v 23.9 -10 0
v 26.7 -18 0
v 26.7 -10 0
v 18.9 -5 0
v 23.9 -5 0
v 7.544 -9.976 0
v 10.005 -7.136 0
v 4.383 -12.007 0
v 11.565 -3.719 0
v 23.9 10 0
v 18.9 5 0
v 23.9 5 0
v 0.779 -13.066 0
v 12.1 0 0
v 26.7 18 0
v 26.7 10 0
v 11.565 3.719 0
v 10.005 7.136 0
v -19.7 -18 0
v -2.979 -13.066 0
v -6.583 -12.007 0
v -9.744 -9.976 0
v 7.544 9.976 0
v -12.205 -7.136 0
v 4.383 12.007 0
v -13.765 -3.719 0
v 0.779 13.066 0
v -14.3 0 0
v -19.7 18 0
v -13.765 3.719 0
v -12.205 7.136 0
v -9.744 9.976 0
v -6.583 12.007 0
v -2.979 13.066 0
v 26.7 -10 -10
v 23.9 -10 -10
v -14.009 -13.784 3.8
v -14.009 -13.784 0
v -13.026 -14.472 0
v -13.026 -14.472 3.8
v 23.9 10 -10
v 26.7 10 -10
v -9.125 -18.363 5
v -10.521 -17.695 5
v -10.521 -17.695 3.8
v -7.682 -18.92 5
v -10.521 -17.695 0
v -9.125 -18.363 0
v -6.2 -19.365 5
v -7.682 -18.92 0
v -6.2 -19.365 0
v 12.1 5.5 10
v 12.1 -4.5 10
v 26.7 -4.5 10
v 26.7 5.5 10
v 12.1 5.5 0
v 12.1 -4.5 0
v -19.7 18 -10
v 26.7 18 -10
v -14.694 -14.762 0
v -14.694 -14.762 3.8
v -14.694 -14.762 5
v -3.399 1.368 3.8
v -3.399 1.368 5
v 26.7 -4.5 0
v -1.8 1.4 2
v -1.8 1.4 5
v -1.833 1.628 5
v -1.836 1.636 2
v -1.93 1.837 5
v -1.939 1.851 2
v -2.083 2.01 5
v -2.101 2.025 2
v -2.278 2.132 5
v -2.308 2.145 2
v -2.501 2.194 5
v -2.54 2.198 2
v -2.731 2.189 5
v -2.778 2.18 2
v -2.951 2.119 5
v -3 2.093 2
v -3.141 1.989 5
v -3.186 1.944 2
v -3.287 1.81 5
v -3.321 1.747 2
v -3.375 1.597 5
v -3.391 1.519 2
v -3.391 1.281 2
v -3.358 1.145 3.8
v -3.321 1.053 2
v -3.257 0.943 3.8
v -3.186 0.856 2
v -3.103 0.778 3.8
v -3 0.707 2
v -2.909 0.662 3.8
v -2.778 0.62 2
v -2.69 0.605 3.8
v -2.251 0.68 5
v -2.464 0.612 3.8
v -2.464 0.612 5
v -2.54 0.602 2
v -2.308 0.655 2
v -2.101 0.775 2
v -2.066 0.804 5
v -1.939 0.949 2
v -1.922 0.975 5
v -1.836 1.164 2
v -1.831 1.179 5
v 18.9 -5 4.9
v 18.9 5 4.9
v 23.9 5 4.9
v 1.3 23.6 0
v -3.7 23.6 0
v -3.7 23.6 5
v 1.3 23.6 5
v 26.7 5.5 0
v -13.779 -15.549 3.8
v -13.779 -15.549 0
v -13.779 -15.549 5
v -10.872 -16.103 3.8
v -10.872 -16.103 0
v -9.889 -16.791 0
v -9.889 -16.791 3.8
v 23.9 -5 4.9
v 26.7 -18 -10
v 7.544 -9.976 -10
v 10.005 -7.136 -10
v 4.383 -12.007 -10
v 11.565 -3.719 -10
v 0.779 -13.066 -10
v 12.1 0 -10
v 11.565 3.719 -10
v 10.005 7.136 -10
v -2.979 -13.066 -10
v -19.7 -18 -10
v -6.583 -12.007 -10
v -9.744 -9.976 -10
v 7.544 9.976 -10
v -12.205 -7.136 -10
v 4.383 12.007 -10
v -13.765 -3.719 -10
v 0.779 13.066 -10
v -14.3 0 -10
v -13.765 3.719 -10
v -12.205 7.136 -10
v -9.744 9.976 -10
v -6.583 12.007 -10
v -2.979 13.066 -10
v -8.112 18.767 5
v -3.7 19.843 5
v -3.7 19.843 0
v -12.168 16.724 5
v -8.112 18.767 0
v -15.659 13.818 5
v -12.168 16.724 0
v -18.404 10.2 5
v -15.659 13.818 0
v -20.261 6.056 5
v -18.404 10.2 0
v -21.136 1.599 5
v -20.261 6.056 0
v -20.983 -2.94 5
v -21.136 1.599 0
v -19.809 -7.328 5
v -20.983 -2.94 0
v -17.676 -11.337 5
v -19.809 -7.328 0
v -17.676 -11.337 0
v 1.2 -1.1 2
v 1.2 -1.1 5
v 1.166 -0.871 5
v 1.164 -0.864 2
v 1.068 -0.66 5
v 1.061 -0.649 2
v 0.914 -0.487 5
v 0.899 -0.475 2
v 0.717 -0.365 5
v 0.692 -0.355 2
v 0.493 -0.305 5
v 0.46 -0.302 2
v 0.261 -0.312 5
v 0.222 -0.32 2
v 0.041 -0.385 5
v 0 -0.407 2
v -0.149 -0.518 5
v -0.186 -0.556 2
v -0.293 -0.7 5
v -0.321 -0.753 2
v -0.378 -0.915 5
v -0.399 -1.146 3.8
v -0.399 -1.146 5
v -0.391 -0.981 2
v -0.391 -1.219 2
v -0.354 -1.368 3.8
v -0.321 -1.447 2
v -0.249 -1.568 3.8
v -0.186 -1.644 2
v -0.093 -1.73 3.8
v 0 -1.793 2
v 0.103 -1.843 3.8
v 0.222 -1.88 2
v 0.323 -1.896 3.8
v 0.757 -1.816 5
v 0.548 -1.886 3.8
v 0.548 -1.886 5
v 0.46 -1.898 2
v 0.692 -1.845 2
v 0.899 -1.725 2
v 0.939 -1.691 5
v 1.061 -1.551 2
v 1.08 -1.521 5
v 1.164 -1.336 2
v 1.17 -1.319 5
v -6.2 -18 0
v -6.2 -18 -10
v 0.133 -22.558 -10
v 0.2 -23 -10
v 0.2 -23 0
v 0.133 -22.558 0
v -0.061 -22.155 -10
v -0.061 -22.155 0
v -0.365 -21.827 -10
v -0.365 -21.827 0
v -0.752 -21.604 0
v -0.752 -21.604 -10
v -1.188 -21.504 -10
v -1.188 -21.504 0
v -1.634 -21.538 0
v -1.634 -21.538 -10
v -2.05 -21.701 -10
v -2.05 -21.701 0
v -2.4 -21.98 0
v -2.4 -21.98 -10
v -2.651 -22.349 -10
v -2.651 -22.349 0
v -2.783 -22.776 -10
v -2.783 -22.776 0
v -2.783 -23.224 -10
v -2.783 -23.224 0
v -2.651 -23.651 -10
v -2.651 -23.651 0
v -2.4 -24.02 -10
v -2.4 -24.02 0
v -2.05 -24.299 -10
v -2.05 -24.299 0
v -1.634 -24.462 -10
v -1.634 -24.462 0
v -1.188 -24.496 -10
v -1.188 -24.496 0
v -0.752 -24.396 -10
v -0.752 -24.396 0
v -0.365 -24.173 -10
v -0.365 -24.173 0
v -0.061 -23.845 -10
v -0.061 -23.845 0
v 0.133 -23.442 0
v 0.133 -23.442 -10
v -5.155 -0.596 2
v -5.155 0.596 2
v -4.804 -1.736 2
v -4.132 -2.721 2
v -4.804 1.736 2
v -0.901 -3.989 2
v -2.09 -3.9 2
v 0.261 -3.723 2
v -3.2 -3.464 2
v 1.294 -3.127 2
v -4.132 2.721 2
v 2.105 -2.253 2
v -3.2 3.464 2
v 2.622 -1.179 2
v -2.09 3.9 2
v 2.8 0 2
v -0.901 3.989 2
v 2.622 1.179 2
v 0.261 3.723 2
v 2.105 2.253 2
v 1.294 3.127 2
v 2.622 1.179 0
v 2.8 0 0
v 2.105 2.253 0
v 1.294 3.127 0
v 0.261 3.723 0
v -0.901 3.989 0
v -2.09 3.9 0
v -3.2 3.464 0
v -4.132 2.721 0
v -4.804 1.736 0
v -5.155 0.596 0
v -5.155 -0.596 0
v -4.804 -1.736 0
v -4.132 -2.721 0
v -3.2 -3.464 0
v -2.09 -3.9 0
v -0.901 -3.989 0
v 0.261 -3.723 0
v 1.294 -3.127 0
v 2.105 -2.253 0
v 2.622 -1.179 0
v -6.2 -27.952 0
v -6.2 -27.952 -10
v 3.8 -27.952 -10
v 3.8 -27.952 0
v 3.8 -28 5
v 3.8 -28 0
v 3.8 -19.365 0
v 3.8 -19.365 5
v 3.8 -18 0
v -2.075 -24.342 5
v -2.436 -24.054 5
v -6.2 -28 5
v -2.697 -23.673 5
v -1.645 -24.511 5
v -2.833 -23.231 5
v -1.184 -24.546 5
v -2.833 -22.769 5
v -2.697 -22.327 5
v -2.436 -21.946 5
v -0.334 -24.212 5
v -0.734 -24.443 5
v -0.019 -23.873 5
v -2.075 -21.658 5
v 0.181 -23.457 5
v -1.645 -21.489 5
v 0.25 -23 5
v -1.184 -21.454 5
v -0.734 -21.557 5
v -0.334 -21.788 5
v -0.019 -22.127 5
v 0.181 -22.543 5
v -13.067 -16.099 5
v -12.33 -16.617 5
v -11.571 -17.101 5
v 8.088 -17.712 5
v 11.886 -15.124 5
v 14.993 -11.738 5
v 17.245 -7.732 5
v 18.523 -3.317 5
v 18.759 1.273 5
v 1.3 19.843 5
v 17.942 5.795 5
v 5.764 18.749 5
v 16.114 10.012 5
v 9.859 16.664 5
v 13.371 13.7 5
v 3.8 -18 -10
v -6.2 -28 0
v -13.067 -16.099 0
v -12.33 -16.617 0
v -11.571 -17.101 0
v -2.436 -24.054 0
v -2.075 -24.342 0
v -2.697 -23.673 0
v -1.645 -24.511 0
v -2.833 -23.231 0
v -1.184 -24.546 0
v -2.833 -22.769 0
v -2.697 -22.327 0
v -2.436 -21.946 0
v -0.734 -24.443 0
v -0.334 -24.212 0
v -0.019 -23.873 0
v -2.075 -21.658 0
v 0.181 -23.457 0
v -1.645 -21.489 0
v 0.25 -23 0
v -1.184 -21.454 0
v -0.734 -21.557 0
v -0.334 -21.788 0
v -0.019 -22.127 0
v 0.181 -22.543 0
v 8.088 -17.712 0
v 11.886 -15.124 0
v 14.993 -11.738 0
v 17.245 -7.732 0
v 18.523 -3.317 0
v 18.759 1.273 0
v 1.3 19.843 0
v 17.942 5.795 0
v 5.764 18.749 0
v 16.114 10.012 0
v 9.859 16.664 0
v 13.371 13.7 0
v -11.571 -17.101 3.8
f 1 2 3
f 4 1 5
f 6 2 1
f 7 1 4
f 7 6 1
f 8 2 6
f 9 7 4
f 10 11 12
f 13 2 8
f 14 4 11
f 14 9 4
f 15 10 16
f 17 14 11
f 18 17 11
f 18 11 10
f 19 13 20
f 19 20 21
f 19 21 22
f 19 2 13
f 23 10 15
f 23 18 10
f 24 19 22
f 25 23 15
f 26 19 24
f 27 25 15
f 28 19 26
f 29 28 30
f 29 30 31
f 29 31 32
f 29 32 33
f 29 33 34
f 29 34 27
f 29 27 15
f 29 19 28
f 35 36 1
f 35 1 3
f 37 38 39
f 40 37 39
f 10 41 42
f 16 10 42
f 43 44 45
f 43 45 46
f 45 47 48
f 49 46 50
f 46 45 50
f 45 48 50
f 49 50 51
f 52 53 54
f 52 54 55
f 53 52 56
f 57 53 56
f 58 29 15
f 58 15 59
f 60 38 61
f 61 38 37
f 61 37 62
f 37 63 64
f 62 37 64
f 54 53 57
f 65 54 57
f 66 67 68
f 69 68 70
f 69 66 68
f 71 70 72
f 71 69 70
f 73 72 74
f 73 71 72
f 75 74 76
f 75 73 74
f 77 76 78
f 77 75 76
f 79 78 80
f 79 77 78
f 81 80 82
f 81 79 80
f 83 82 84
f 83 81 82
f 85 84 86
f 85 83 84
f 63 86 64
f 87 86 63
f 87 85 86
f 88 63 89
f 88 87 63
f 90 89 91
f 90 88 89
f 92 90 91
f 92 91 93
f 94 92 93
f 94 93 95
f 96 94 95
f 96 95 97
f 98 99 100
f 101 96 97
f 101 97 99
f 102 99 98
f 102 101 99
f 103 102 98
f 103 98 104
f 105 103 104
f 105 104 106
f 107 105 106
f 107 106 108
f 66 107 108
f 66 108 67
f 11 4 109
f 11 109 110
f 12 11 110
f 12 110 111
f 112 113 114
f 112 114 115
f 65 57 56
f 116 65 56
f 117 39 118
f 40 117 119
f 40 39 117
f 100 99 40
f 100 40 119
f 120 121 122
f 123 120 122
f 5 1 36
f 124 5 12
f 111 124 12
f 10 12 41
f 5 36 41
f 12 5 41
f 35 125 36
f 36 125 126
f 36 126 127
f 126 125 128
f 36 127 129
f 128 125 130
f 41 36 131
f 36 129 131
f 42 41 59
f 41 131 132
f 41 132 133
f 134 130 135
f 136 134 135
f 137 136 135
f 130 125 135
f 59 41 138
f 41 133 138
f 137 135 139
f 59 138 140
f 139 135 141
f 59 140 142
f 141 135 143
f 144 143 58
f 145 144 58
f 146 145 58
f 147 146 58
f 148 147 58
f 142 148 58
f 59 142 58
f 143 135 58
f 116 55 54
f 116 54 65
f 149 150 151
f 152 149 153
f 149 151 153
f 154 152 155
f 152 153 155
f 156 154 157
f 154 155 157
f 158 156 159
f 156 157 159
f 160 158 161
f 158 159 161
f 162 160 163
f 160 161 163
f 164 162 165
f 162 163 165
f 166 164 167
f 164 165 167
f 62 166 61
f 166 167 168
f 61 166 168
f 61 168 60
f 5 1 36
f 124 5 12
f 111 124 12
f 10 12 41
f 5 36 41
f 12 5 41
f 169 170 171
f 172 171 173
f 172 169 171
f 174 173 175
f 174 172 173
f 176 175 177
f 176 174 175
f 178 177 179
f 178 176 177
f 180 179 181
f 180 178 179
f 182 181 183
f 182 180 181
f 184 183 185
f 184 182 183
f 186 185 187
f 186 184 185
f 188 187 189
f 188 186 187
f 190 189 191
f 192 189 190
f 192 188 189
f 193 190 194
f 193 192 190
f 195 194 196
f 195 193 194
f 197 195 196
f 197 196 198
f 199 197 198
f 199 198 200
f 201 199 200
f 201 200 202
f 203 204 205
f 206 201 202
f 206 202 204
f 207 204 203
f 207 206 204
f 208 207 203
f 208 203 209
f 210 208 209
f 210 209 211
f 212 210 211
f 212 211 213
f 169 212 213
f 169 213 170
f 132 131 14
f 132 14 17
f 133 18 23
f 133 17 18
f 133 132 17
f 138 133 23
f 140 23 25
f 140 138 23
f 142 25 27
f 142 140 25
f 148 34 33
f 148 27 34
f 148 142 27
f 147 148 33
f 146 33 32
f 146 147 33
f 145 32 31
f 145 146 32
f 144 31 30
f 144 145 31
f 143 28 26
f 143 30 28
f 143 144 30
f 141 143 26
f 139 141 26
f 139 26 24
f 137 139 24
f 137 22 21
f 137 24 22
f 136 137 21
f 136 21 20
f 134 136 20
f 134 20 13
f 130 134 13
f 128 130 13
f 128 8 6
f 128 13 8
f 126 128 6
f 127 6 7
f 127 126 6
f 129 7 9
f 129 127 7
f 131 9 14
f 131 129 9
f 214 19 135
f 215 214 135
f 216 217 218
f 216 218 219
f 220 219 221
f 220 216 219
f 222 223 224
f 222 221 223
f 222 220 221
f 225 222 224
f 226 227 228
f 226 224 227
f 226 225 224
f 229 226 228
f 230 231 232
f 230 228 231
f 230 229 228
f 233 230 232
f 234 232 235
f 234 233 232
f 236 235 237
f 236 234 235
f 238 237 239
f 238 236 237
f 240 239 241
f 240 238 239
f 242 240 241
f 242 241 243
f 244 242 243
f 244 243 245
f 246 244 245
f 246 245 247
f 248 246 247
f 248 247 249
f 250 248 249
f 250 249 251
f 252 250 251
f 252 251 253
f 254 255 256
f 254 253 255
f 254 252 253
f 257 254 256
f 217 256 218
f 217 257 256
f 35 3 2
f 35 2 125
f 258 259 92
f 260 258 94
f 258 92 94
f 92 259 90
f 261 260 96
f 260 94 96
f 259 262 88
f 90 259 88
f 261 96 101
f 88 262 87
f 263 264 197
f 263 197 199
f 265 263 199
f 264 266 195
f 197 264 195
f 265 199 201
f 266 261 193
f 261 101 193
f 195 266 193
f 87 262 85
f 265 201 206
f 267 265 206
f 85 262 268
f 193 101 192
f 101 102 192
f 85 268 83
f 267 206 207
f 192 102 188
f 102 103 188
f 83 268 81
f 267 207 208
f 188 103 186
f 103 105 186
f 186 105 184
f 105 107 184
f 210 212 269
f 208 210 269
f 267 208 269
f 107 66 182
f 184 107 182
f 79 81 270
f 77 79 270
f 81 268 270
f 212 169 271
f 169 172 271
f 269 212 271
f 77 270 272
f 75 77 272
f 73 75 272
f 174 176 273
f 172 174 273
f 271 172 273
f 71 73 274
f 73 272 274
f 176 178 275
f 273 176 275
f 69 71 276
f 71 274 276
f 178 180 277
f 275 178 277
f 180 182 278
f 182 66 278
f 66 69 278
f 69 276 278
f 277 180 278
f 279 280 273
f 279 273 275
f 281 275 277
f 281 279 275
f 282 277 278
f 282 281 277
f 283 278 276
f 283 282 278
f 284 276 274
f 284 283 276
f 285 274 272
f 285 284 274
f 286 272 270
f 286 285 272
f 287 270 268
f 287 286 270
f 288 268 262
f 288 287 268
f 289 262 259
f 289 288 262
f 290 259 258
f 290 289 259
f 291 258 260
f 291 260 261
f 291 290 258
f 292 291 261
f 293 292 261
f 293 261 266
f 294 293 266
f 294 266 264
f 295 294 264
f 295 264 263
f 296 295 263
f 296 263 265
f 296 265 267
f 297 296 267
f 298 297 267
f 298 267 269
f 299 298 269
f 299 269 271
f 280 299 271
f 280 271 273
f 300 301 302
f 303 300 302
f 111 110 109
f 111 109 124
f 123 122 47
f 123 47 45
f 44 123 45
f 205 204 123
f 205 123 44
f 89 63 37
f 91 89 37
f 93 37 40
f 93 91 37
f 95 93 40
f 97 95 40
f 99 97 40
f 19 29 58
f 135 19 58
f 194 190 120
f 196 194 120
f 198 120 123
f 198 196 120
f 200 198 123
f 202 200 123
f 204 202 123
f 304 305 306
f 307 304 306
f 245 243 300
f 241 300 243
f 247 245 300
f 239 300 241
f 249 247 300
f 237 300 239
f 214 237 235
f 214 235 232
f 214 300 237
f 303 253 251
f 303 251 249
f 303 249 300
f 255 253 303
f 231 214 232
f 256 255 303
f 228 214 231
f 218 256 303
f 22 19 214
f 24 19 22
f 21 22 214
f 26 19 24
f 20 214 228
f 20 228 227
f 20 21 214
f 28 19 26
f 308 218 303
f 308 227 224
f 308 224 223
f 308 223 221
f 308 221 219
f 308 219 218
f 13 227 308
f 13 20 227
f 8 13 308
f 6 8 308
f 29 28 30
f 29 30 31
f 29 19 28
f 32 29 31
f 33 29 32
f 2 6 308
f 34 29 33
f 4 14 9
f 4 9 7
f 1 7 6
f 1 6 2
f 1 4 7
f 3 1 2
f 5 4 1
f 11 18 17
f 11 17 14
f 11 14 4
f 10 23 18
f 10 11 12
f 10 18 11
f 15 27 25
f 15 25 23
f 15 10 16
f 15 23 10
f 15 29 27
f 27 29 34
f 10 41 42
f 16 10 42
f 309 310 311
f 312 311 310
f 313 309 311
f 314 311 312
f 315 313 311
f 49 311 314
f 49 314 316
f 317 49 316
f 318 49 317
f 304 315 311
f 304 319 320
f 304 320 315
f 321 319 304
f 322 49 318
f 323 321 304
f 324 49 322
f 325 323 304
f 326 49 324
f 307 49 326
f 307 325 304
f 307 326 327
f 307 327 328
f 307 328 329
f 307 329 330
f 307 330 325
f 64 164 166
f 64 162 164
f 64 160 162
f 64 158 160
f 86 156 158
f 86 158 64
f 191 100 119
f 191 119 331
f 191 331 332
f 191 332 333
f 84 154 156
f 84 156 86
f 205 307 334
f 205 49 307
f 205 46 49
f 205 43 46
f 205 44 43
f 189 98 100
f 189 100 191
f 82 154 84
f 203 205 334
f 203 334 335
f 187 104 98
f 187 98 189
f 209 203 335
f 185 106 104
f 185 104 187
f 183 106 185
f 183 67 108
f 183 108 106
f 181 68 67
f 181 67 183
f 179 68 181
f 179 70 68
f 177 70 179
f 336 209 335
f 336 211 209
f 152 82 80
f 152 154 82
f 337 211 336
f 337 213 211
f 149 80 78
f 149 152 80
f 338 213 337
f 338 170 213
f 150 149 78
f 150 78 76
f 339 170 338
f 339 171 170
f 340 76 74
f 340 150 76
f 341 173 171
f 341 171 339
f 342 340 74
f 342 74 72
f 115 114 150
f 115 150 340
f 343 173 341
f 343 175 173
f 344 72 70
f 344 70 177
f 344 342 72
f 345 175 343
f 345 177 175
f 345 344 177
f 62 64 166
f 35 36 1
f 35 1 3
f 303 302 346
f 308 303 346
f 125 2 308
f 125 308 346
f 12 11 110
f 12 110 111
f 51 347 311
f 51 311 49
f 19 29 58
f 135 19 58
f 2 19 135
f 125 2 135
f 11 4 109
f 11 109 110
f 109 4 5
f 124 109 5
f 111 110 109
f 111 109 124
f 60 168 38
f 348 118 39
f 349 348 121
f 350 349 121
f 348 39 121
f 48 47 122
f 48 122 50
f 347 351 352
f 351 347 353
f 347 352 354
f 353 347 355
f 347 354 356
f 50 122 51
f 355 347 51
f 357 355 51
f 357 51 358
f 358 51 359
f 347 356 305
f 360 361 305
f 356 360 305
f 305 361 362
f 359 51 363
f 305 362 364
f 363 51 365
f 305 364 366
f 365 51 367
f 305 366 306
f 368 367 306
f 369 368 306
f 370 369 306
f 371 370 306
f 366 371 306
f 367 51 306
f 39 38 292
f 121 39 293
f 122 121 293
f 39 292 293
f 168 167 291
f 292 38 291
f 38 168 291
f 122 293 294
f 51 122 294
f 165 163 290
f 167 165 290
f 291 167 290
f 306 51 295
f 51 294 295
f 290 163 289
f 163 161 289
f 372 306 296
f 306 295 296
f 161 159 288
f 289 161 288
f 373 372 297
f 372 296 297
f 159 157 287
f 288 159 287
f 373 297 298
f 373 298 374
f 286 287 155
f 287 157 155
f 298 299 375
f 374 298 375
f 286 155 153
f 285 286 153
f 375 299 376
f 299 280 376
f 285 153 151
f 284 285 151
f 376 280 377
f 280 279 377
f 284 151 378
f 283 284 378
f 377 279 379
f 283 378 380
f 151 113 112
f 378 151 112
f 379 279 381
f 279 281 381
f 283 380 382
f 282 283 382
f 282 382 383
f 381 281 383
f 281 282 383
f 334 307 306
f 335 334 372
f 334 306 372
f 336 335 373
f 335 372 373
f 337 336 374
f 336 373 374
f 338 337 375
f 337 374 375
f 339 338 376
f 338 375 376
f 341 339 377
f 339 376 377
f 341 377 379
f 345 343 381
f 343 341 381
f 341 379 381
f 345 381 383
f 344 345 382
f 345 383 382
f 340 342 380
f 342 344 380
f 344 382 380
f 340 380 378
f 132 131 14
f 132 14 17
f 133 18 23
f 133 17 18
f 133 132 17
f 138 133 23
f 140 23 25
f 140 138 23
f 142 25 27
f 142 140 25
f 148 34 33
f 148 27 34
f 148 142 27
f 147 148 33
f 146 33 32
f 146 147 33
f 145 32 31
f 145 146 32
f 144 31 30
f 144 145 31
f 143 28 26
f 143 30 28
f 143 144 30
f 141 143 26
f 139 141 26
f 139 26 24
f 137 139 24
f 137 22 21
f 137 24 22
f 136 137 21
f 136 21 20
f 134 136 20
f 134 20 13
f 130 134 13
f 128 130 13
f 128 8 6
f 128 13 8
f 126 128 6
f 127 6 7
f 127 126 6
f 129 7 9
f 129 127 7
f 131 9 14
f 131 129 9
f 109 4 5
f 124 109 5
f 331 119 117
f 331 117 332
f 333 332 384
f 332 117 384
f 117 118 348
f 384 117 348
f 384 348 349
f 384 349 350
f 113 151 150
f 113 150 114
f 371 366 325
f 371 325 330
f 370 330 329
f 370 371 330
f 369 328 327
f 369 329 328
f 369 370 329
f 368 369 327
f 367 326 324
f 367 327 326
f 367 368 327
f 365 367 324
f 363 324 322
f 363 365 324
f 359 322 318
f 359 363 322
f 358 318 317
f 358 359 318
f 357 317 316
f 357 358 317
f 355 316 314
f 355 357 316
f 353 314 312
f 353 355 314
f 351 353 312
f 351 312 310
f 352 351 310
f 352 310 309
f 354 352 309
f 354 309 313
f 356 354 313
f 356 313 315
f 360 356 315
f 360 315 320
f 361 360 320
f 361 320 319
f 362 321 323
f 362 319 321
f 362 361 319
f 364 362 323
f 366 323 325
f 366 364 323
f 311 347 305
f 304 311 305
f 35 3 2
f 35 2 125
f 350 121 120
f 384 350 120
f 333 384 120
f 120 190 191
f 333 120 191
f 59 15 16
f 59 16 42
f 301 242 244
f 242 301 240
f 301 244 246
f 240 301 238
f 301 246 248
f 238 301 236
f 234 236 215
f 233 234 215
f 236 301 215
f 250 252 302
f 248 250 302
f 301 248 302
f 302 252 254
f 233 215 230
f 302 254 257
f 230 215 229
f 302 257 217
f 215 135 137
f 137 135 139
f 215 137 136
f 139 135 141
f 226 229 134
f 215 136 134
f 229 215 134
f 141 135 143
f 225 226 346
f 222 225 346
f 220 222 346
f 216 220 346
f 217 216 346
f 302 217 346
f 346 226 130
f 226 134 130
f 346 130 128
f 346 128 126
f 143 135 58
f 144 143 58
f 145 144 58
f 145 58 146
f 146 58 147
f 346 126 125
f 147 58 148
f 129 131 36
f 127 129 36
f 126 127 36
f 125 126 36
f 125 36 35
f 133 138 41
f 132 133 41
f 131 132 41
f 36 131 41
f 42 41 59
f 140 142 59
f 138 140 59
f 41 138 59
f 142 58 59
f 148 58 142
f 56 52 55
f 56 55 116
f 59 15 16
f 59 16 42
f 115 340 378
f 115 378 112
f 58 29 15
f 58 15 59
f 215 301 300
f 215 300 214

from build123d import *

# Parameters (mm, degrees)
BOX001_W               = 10
BOX001_H               = 10
BOX001_DEPTH           = 14.6
BOX004_W               = 5
BOX004_H               = 10
BOX004_DEPTH           = 5
BOX005_W               = 10
BOX005_H               = 20
BOX005_DEPTH           = 20
CYLINDER_R             = 13.2
CYLINDER_DEPTH         = 40
BOX_W                  = 10
BOX_H                  = 36
BOX_DEPTH              = 46.4
BOX006_W               = 5
BOX006_H               = 5
BOX006_DEPTH           = 5
CYLINDER003_R          = 1.55
CYLINDER003_DEPTH      = 50
BOX003_W               = 10
BOX003_H               = 14
BOX003_DEPTH           = 5
BOX010_W               = 1.2
BOX010_H               = 30
BOX010_DEPTH           = 10
BOX010_ROLL_ANGLE      = 90
BOX010_PLACEMENT_ANGLE = -35
BOX009_W               = 1.2
BOX009_H               = 30
BOX009_DEPTH           = 10
BOX009_ROLL_ANGLE      = 90
BOX009_PLACEMENT_ANGLE = -35
BOX008_W               = 1.2
BOX008_H               = 30
BOX008_DEPTH           = 10
BOX008_PLACEMENT_ANGLE = 325
BOX007_W               = 1.2
BOX007_H               = 30
BOX007_DEPTH           = 10
BOX007_PLACEMENT_ANGLE = 325
CYLINDER006_R          = 0.8
CYLINDER006_DEPTH      = 30
CYLINDER005_R          = 0.8
CYLINDER005_DEPTH      = 30
CYLINDER004_R          = 4
CYLINDER004_DEPTH      = 10
CYLINDER002_R          = 20
CYLINDER002_DEPTH      = 5
CYLINDER001_R          = 1.5
CYLINDER001_DEPTH      = 30
BOX002_W               = 10
BOX002_H               = 10
BOX002_DEPTH           = 10


with BuildPart() as cube001:
    # Box001 → Box001 (new body)
    with BuildSketch(Plane(origin=(12.1, -4.5, 10), x_dir=(0, 0, -1), z_dir=(1, 0, 0))):
        with Locations((5, 5)):
            Rectangle(BOX001_W, BOX001_H)
    extrude(amount=BOX001_DEPTH)


with BuildPart() as swivelstop:
    # Box004 → Box004 (new body)
    with BuildSketch(Plane(origin=(18.9, -5, -0.1), x_dir=(1, 0, 0), z_dir=(0, 0, 1))):
        with Locations((2.5, 5)):
            Rectangle(BOX004_W, BOX004_H)
    extrude(amount=BOX004_DEPTH)


with BuildPart() as footcutout:
    # Box005 → Box005 (new body)
    with BuildSketch(Plane(origin=(23.9, -10, -18), x_dir=(1, 0, 0), z_dir=(0, 0, 1))):
        with Locations((5, 10)):
            Rectangle(BOX005_W, BOX005_H)
    extrude(amount=BOX005_DEPTH)


with BuildPart() as cardboardbarrelholder:
    # Cylinder → Cylinder (new body)
    with BuildSketch(Plane(origin=(-1.1, 0, -20), x_dir=(1, 0, 0), z_dir=(0, 0, 1))):
        Circle(CYLINDER_R)
    extrude(amount=CYLINDER_DEPTH)


with BuildPart() as mainpiece1:
    # Box → Box (new body)
    with BuildSketch(Plane(origin=(-19.7, -18, 0), x_dir=(0, 0, -1), z_dir=(1, 0, 0))):
        with Locations((5, 18)):
            Rectangle(BOX_W, BOX_H)
    extrude(amount=BOX_DEPTH)

    # Cut: cut cardboardBarrelHolder
    add(cardboardbarrelholder.part, mode=Mode.SUBTRACT)

    # Cut001: cut footCutout
    add(footcutout.part, mode=Mode.SUBTRACT)


with BuildPart() as don_tusemainpiece3:
    # Fusion002 base: copy of mainPiece1
    add(mainpiece1.part)

    # Fusion002: union swivelStop
    add(swivelstop.part)


with BuildPart() as shuttermovetab:
    # Box006 → Box006 (new body)
    with BuildSketch(Plane(origin=(-3.7, 18.6, 0), x_dir=(1, 0, 0), z_dir=(0, 0, 1))):
        with Locations((2.5, 2.5)):
            Rectangle(BOX006_W, BOX006_H)
    extrude(amount=BOX006_DEPTH)


with BuildPart() as shuttertabhole:
    # Cylinder003 → Cylinder003 (new body)
    with BuildSketch(Plane(origin=(-1.3, -23, -12), x_dir=(1, 0, 0), z_dir=(0, 0, 1))):
        Circle(CYLINDER003_R)
    extrude(amount=CYLINDER003_DEPTH)


with BuildPart() as shutterhingetab001:
    # Box003 → Box003 (new body)
    with BuildSketch(Plane(origin=(-6.2, -28, 0), x_dir=(1, 0, 0), z_dir=(0, 0, 1))):
        with Locations((5, 7)):
            Rectangle(BOX003_W, BOX003_H)
    extrude(amount=BOX003_DEPTH)

    # Cut009: cut shutterTabHole
    add(shuttertabhole.part, mode=Mode.SUBTRACT)


with BuildPart() as radialtransit4:
    # Box010 → Box010 (new body)
    with BuildSketch(Plane.XY):
        with Locations((0.6, 15)):
            Rectangle(BOX010_W, BOX010_H)
    extrude(amount=BOX010_DEPTH)


with BuildPart() as radialtransit4_1:
    # Box010 roll: moved
    add(radialtransit4.part.rotate(Axis((0, 0, 0), (1, 0, 0)), BOX010_ROLL_ANGLE))


with BuildPart() as radialtransit4_2:
    # Box010 placement: moved
    add(radialtransit4_1.part.moved(Location((-14.008889, -13.784169, -4.1))).rotate(Axis((-14.008889, -13.784169, -4.1), (0, 0, 1)), BOX010_PLACEMENT_ANGLE))


with BuildPart() as radialtransit3:
    # Box009 → Box009 (new body)
    with BuildSketch(Plane.XY):
        with Locations((0.6, 15)):
            Rectangle(BOX009_W, BOX009_H)
    extrude(amount=BOX009_DEPTH)


with BuildPart() as radialtransit3_1:
    # Box009 roll: moved
    add(radialtransit3.part.rotate(Axis((0, 0, 0), (1, 0, 0)), BOX009_ROLL_ANGLE))


with BuildPart() as radialtransit3_2:
    # Box009 placement: moved
    add(radialtransit3_1.part.moved(Location((-10.871554, -16.103032, -4.1))).rotate(Axis((-10.871554, -16.103032, -4.1), (0, 0, 1)), BOX009_PLACEMENT_ANGLE))


with BuildPart() as radialtransit2:
    # Box008 → Box008 (new body)
    with BuildSketch(Plane.XY):
        with Locations((0.6, 15)):
            Rectangle(BOX008_W, BOX008_H)
    extrude(amount=BOX008_DEPTH)


with BuildPart() as radialtransit2_1:
    # Box008 placement: moved
    add(radialtransit2.part.moved(Location((-20.375588, -22.876757, 3.8))).rotate(Axis((-20.375588, -22.876757, 3.8), (0, 0, 1)), BOX008_PLACEMENT_ANGLE))


with BuildPart() as radialtransit1:
    # Box007 → Box007 (new body)
    with BuildSketch(Plane.XY):
        with Locations((0.6, 15)):
            Rectangle(BOX007_W, BOX007_H)
    extrude(amount=BOX007_DEPTH)


with BuildPart() as radialtransit1_1:
    # Box007 placement: moved
    add(radialtransit1.part.moved(Location((-17.352968, -25.35945, 3.8))).rotate(Axis((-17.352968, -25.35945, 3.8), (0, 0, 1)), BOX007_PLACEMENT_ANGLE))


with BuildPart() as cdswire2:
    # Cylinder006 → Cylinder006 (new body)
    with BuildSketch(Plane(origin=(-2.6, 1.4, -18), x_dir=(1, 0, 0), z_dir=(0, 0, 1))):
        Circle(CYLINDER006_R)
    extrude(amount=CYLINDER006_DEPTH)


with BuildPart() as cdswire1:
    # Cylinder005 → Cylinder005 (new body)
    with BuildSketch(Plane(origin=(0.4, -1.1, -18), x_dir=(1, 0, 0), z_dir=(0, 0, 1))):
        Circle(CYLINDER005_R)
    extrude(amount=CYLINDER005_DEPTH)


with BuildPart() as cdsdivot:
    # Cylinder004 → Cylinder004 (new body)
    with BuildSketch(Plane(origin=(-1.2, 0, -8), x_dir=(1, 0, 0), z_dir=(0, 0, 1))):
        Circle(CYLINDER004_R)
    extrude(amount=CYLINDER004_DEPTH)


with BuildPart() as shutter4:
    # Cylinder002 → Cylinder002 (new body)
    with BuildSketch(Plane(origin=(-1.2, 0, 0), x_dir=(1, 0, 0), z_dir=(0, 0, 1))):
        Circle(CYLINDER002_R)
    extrude(amount=CYLINDER002_DEPTH)

    # Cut002: cut CdSDivot
    add(cdsdivot.part, mode=Mode.SUBTRACT)

    # Cut003: cut CdSWire1
    add(cdswire1.part, mode=Mode.SUBTRACT)

    # Cut004: cut CdsWire2
    add(cdswire2.part, mode=Mode.SUBTRACT)

    # Cut005: cut radialTransit1
    add(radialtransit1_1.part, mode=Mode.SUBTRACT)

    # Cut006: cut radialTransit2
    add(radialtransit2_1.part, mode=Mode.SUBTRACT)

    # Cut007: cut radialTransit3
    add(radialtransit3_2.part, mode=Mode.SUBTRACT)

    # Cut008: cut radialTransit4
    add(radialtransit4_2.part, mode=Mode.SUBTRACT)

    # Fusion001: union shutterHingeTab001
    add(shutterhingetab001.part)

    # Fusion003: union shutterMoveTab
    add(shuttermovetab.part)


with BuildPart() as hingetabhole:
    # Cylinder001 → Cylinder001 (new body)
    with BuildSketch(Plane(origin=(-1.3, -23, -12), x_dir=(1, 0, 0), z_dir=(0, 0, 1))):
        Circle(CYLINDER001_R)
    extrude(amount=CYLINDER001_DEPTH)


with BuildPart() as mainpiecehingetab:
    # Box002 → Box002 (new body)
    with BuildSketch(Plane(origin=(-6.2, -27.952, -10), x_dir=(1, 0, 0), z_dir=(0, 0, 1))):
        with Locations((5, 5)):
            Rectangle(BOX002_W, BOX002_H)
    extrude(amount=BOX002_DEPTH)

    # Cut010: cut hingeTabHole
    add(hingetabhole.part, mode=Mode.SUBTRACT)


with BuildPart() as mainpiece10:
    # Fusion base: copy of mainPiece1
    add(mainpiece1.part)

    # Fusion: union mainPieceHingeTab
    add(mainpiecehingetab.part)

    # Fusion004: union swivelStop
    add(swivelstop.part)


solid = Compound([cube001.part, don_tusemainpiece3.part, shutter4.part, mainpiece10.part])
